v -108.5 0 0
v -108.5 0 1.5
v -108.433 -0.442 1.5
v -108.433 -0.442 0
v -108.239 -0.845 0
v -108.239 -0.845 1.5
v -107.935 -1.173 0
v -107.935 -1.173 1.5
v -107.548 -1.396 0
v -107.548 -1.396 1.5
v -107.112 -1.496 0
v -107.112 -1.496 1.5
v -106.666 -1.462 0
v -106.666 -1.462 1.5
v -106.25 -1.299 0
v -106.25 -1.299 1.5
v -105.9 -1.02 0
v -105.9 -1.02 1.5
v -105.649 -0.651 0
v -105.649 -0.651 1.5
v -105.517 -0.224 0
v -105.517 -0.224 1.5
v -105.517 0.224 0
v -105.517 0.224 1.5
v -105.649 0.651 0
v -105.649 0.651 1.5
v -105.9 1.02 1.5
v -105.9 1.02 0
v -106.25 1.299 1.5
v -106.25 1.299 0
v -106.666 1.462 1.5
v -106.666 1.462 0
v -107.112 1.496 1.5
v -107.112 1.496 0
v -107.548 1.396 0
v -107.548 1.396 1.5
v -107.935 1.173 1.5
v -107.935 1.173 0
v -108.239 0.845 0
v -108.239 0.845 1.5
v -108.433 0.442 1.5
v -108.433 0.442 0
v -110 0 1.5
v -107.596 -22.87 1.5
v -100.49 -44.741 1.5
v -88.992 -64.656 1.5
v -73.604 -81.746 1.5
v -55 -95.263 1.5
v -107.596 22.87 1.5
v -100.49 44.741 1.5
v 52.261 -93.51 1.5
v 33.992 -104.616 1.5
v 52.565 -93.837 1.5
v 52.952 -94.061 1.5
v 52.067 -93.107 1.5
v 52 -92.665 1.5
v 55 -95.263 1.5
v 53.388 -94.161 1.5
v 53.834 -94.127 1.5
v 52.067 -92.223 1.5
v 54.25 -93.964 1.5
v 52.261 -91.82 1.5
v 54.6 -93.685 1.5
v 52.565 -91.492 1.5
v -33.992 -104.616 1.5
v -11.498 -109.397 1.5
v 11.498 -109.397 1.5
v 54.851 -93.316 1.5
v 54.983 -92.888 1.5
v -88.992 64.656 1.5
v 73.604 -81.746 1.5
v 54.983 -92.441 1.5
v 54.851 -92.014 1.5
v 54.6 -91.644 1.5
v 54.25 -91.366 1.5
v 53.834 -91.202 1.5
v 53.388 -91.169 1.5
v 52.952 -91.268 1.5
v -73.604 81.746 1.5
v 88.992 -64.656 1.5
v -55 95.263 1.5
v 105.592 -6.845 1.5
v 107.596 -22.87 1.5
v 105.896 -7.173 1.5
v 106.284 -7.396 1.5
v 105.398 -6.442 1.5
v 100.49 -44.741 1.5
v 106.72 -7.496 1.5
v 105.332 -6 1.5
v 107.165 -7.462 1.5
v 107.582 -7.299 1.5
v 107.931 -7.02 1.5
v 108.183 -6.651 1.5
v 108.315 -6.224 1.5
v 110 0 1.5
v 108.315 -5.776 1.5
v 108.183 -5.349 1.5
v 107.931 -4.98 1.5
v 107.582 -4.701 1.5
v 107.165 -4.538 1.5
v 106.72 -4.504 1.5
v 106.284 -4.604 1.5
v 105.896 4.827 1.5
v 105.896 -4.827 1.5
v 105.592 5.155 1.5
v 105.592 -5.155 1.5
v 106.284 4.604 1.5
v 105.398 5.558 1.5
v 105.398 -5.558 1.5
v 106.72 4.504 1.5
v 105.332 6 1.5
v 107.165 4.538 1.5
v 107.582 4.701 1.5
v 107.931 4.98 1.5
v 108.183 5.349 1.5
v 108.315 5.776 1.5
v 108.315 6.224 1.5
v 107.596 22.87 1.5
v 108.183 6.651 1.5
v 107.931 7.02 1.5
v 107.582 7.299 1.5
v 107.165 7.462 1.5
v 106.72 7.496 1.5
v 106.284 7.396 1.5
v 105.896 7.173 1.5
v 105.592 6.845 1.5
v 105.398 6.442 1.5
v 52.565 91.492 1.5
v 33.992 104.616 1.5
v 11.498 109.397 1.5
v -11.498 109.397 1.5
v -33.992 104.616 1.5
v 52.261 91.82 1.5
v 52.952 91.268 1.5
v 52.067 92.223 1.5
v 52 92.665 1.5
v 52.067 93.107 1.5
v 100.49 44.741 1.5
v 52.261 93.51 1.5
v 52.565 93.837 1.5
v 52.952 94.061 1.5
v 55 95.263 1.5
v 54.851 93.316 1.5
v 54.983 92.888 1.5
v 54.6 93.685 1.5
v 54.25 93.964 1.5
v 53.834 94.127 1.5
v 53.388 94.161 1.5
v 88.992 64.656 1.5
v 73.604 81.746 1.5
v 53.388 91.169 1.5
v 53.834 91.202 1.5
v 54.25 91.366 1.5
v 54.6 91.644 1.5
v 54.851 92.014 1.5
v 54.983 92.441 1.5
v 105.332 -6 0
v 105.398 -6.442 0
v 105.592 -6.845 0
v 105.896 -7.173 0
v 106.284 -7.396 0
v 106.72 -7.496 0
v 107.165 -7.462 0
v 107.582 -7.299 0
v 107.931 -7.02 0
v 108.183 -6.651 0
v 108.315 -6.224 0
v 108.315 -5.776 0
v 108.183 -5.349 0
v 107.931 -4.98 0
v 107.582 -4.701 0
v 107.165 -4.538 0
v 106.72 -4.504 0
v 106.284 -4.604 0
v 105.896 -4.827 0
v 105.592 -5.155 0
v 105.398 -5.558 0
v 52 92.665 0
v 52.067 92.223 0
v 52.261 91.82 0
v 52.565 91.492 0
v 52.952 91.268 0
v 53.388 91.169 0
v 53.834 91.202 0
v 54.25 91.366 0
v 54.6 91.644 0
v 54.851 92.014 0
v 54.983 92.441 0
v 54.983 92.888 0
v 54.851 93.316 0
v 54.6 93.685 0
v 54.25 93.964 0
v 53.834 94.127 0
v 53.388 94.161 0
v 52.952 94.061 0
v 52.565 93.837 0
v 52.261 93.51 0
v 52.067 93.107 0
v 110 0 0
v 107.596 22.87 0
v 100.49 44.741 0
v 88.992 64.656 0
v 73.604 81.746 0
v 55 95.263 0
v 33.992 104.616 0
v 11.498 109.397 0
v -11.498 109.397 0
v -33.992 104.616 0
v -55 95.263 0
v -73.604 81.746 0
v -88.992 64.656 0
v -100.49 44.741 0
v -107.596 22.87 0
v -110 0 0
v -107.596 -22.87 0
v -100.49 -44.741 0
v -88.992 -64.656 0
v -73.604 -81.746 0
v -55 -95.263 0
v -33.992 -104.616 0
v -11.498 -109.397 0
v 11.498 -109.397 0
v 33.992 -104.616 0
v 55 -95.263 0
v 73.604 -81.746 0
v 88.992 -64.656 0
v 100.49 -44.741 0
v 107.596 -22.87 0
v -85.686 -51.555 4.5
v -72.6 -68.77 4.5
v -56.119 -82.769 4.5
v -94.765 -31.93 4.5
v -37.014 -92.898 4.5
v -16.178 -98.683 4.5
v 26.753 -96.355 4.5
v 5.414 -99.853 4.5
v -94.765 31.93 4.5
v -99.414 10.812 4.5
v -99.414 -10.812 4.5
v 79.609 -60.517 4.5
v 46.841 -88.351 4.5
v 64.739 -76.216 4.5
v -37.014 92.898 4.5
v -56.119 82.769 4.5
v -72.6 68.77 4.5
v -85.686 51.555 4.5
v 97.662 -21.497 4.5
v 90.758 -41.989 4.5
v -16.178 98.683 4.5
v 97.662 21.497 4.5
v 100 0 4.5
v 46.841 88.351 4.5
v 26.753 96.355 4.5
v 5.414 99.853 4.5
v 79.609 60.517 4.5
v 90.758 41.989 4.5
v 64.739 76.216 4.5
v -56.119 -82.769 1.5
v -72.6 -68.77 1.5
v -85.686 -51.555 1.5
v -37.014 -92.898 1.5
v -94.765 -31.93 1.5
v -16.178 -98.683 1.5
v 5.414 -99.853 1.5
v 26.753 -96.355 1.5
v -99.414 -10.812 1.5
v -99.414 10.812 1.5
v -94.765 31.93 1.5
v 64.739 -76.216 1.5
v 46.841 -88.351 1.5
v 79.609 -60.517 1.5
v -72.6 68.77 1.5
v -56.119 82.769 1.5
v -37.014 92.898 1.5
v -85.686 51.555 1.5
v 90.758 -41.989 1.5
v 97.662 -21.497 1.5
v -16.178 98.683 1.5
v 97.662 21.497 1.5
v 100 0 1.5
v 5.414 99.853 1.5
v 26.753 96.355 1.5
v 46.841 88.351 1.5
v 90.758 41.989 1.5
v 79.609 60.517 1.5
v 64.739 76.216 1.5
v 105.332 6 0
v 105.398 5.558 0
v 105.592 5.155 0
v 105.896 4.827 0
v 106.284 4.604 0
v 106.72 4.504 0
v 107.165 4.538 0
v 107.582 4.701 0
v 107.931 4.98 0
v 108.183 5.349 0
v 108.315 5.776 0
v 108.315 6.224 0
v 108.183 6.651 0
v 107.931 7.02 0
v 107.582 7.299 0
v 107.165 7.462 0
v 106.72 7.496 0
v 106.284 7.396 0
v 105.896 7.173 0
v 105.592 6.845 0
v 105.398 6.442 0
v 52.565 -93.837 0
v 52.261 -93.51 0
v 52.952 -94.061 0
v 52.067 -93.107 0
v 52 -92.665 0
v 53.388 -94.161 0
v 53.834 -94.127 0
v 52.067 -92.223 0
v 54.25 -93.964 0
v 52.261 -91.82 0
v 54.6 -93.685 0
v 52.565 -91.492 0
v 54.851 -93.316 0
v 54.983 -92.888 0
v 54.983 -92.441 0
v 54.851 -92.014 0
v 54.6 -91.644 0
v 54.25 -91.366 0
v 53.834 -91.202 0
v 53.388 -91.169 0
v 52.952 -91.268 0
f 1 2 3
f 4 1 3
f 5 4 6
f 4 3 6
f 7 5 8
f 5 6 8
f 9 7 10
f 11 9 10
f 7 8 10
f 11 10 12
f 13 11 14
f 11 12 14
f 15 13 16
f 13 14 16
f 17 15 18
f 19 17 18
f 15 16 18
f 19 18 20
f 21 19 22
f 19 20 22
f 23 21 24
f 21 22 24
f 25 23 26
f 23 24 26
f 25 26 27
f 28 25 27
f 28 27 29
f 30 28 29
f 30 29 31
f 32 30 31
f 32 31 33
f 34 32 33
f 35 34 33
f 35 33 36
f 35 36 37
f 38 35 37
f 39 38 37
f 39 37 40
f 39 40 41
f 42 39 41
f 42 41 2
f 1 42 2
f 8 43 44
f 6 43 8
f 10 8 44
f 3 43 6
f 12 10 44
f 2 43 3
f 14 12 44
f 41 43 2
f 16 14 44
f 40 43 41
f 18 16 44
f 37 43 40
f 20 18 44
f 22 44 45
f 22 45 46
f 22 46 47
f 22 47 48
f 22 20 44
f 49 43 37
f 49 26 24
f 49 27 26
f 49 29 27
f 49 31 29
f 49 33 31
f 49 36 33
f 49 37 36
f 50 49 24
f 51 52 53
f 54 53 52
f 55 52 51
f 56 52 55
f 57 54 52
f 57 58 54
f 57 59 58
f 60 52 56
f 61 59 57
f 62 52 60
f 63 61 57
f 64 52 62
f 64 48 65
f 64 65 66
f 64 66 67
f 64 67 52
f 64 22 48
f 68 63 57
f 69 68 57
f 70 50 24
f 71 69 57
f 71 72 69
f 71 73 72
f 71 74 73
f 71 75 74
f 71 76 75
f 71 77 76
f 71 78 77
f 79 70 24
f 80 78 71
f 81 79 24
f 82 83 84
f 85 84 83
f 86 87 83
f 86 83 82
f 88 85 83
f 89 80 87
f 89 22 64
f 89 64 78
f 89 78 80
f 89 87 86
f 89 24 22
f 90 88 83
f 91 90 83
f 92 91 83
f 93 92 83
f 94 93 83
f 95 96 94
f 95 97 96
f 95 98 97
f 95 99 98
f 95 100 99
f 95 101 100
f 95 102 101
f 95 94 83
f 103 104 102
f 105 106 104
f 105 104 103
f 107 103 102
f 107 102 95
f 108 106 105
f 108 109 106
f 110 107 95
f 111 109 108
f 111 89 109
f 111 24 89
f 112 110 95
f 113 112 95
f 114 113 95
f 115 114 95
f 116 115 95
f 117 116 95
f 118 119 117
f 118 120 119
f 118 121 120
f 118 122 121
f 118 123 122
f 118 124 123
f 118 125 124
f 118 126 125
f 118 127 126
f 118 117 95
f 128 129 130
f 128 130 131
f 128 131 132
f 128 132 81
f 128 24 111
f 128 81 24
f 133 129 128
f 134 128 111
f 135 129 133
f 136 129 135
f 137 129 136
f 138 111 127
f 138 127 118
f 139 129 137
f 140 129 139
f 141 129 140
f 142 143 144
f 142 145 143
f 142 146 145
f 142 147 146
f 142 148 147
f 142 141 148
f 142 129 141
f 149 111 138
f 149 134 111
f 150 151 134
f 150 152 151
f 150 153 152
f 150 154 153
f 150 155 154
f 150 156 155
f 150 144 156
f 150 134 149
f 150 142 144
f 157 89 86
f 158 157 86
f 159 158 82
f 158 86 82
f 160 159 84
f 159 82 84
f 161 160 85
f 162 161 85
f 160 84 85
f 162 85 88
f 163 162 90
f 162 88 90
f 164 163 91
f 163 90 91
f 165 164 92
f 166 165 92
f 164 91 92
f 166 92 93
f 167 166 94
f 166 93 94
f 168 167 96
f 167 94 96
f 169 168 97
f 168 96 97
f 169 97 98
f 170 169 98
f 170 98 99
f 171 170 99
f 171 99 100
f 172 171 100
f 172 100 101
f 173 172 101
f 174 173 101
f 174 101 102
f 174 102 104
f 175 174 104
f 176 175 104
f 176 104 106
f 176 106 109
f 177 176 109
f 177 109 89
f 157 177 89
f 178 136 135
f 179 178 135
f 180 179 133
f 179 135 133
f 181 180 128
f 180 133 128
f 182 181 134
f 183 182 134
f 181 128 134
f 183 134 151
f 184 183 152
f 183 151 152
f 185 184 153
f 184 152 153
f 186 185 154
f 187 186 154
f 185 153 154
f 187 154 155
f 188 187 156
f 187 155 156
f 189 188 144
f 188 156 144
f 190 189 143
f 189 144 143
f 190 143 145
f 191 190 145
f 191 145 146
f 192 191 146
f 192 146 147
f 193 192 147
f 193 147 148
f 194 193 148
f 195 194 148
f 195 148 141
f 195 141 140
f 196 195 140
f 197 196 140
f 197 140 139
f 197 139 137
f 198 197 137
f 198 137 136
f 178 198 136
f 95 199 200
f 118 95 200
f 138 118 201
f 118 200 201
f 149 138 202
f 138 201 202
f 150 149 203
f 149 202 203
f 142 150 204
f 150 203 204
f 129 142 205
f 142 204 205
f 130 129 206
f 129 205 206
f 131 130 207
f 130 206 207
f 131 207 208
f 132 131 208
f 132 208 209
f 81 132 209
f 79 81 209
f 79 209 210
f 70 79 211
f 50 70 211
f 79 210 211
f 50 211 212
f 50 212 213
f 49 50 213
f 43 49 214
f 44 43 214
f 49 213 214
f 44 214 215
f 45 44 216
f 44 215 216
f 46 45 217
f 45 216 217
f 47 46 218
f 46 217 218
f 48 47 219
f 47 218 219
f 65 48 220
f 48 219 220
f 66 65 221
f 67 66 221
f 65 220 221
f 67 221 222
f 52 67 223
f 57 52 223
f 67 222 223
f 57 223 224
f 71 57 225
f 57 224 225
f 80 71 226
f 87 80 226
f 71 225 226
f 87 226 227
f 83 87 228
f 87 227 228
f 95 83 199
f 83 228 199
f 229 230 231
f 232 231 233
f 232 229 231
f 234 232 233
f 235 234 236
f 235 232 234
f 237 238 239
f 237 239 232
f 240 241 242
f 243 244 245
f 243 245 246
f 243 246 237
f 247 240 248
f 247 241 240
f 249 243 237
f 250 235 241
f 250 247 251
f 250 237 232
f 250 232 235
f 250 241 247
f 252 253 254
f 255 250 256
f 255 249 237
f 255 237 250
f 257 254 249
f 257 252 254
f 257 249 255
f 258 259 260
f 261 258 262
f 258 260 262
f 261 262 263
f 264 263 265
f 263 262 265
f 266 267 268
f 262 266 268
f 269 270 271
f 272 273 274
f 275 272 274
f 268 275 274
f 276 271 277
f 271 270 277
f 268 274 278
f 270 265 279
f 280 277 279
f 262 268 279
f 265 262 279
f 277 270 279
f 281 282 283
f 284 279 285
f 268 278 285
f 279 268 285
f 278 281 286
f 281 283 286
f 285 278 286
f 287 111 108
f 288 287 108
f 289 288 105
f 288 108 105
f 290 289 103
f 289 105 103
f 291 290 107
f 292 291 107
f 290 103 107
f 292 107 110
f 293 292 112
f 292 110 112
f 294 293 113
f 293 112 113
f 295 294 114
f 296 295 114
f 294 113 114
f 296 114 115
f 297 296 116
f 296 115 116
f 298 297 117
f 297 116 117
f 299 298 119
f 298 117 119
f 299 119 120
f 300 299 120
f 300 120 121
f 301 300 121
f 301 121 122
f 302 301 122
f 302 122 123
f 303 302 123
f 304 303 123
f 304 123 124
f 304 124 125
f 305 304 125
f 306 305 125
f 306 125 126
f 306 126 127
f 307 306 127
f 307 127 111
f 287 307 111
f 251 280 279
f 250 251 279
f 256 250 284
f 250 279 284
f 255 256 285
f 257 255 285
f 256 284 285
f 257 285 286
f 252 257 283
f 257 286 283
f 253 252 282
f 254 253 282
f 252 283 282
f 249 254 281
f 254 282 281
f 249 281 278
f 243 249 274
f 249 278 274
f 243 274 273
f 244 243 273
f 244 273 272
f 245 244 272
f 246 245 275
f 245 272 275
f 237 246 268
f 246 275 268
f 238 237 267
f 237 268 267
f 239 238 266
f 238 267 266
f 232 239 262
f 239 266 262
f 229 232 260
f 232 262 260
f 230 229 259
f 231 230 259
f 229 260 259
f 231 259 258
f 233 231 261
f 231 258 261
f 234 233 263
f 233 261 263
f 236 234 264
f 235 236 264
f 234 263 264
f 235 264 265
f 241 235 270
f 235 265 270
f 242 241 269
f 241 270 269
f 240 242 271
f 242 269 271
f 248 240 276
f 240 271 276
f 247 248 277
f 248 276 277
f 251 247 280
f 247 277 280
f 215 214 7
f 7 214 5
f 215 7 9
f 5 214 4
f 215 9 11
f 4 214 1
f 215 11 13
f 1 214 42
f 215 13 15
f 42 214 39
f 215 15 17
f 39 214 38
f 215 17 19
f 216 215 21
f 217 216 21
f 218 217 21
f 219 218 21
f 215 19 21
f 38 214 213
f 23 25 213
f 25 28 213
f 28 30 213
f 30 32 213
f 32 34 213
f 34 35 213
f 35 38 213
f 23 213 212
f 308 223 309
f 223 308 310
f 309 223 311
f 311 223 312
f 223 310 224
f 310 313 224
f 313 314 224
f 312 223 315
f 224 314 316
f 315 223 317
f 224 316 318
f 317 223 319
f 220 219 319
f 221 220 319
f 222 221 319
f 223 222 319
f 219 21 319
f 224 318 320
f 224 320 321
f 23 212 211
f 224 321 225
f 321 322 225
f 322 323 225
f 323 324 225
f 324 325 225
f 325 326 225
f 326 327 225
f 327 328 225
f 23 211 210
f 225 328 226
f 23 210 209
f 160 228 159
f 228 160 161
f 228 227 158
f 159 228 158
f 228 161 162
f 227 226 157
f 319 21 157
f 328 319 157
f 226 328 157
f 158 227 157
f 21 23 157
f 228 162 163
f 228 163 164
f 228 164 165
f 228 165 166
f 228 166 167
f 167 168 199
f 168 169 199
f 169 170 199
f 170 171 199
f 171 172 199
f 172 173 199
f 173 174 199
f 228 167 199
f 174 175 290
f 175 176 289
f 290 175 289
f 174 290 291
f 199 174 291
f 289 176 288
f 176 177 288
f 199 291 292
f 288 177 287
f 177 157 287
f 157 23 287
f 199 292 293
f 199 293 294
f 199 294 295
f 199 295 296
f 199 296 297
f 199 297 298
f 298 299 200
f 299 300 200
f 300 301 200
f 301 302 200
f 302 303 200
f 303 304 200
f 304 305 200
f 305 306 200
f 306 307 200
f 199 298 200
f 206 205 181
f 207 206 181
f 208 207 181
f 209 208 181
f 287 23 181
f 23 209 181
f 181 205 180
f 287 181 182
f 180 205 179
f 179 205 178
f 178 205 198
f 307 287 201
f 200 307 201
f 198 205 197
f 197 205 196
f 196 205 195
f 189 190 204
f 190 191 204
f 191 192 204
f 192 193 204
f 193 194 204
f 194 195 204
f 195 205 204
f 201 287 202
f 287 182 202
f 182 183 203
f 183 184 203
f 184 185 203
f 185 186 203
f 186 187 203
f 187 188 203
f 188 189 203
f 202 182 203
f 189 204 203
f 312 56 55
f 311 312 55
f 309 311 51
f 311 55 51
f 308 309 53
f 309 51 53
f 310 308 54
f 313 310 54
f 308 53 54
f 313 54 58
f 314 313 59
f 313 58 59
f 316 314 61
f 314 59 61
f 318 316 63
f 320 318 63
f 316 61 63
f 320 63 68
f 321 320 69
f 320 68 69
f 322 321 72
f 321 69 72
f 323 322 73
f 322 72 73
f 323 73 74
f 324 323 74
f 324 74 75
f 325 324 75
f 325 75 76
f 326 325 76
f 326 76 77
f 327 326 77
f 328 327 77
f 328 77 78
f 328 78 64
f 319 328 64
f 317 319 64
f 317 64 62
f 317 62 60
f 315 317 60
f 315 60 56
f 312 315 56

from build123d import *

# Parameters (mm, degrees)
F0_R     = 110
F1_DEPTH = 1.5
F2_D     = 3
F2_DEPTH = 10
F3_R     = 100
F4_DEPTH = 3


with BuildPart() as f1:
    # F0 (on Top) → F1 (new body)
    with BuildSketch(Plane.XY):
        Circle(F0_R)
    extrude(amount=F1_DEPTH)

    # F2
    with Locations(Plane(origin=(0, 0, 0), x_dir=(1, 0, 0), z_dir=(0, 0, -1))):
        with Locations((-107, 0), (53.5, 92.664718), (53.5, -92.664718), (106.831643, 6), (106.831643, -6)):
            Hole(F2_D / 2, depth=F2_DEPTH)


with BuildPart() as f4:
    # F3 (on face) → F4 (new body)
    with BuildSketch(Plane.XY.offset(1.5)):
        Circle(F3_R)
    extrude(amount=F4_DEPTH)


solid = Compound([f1.part, f4.part])
